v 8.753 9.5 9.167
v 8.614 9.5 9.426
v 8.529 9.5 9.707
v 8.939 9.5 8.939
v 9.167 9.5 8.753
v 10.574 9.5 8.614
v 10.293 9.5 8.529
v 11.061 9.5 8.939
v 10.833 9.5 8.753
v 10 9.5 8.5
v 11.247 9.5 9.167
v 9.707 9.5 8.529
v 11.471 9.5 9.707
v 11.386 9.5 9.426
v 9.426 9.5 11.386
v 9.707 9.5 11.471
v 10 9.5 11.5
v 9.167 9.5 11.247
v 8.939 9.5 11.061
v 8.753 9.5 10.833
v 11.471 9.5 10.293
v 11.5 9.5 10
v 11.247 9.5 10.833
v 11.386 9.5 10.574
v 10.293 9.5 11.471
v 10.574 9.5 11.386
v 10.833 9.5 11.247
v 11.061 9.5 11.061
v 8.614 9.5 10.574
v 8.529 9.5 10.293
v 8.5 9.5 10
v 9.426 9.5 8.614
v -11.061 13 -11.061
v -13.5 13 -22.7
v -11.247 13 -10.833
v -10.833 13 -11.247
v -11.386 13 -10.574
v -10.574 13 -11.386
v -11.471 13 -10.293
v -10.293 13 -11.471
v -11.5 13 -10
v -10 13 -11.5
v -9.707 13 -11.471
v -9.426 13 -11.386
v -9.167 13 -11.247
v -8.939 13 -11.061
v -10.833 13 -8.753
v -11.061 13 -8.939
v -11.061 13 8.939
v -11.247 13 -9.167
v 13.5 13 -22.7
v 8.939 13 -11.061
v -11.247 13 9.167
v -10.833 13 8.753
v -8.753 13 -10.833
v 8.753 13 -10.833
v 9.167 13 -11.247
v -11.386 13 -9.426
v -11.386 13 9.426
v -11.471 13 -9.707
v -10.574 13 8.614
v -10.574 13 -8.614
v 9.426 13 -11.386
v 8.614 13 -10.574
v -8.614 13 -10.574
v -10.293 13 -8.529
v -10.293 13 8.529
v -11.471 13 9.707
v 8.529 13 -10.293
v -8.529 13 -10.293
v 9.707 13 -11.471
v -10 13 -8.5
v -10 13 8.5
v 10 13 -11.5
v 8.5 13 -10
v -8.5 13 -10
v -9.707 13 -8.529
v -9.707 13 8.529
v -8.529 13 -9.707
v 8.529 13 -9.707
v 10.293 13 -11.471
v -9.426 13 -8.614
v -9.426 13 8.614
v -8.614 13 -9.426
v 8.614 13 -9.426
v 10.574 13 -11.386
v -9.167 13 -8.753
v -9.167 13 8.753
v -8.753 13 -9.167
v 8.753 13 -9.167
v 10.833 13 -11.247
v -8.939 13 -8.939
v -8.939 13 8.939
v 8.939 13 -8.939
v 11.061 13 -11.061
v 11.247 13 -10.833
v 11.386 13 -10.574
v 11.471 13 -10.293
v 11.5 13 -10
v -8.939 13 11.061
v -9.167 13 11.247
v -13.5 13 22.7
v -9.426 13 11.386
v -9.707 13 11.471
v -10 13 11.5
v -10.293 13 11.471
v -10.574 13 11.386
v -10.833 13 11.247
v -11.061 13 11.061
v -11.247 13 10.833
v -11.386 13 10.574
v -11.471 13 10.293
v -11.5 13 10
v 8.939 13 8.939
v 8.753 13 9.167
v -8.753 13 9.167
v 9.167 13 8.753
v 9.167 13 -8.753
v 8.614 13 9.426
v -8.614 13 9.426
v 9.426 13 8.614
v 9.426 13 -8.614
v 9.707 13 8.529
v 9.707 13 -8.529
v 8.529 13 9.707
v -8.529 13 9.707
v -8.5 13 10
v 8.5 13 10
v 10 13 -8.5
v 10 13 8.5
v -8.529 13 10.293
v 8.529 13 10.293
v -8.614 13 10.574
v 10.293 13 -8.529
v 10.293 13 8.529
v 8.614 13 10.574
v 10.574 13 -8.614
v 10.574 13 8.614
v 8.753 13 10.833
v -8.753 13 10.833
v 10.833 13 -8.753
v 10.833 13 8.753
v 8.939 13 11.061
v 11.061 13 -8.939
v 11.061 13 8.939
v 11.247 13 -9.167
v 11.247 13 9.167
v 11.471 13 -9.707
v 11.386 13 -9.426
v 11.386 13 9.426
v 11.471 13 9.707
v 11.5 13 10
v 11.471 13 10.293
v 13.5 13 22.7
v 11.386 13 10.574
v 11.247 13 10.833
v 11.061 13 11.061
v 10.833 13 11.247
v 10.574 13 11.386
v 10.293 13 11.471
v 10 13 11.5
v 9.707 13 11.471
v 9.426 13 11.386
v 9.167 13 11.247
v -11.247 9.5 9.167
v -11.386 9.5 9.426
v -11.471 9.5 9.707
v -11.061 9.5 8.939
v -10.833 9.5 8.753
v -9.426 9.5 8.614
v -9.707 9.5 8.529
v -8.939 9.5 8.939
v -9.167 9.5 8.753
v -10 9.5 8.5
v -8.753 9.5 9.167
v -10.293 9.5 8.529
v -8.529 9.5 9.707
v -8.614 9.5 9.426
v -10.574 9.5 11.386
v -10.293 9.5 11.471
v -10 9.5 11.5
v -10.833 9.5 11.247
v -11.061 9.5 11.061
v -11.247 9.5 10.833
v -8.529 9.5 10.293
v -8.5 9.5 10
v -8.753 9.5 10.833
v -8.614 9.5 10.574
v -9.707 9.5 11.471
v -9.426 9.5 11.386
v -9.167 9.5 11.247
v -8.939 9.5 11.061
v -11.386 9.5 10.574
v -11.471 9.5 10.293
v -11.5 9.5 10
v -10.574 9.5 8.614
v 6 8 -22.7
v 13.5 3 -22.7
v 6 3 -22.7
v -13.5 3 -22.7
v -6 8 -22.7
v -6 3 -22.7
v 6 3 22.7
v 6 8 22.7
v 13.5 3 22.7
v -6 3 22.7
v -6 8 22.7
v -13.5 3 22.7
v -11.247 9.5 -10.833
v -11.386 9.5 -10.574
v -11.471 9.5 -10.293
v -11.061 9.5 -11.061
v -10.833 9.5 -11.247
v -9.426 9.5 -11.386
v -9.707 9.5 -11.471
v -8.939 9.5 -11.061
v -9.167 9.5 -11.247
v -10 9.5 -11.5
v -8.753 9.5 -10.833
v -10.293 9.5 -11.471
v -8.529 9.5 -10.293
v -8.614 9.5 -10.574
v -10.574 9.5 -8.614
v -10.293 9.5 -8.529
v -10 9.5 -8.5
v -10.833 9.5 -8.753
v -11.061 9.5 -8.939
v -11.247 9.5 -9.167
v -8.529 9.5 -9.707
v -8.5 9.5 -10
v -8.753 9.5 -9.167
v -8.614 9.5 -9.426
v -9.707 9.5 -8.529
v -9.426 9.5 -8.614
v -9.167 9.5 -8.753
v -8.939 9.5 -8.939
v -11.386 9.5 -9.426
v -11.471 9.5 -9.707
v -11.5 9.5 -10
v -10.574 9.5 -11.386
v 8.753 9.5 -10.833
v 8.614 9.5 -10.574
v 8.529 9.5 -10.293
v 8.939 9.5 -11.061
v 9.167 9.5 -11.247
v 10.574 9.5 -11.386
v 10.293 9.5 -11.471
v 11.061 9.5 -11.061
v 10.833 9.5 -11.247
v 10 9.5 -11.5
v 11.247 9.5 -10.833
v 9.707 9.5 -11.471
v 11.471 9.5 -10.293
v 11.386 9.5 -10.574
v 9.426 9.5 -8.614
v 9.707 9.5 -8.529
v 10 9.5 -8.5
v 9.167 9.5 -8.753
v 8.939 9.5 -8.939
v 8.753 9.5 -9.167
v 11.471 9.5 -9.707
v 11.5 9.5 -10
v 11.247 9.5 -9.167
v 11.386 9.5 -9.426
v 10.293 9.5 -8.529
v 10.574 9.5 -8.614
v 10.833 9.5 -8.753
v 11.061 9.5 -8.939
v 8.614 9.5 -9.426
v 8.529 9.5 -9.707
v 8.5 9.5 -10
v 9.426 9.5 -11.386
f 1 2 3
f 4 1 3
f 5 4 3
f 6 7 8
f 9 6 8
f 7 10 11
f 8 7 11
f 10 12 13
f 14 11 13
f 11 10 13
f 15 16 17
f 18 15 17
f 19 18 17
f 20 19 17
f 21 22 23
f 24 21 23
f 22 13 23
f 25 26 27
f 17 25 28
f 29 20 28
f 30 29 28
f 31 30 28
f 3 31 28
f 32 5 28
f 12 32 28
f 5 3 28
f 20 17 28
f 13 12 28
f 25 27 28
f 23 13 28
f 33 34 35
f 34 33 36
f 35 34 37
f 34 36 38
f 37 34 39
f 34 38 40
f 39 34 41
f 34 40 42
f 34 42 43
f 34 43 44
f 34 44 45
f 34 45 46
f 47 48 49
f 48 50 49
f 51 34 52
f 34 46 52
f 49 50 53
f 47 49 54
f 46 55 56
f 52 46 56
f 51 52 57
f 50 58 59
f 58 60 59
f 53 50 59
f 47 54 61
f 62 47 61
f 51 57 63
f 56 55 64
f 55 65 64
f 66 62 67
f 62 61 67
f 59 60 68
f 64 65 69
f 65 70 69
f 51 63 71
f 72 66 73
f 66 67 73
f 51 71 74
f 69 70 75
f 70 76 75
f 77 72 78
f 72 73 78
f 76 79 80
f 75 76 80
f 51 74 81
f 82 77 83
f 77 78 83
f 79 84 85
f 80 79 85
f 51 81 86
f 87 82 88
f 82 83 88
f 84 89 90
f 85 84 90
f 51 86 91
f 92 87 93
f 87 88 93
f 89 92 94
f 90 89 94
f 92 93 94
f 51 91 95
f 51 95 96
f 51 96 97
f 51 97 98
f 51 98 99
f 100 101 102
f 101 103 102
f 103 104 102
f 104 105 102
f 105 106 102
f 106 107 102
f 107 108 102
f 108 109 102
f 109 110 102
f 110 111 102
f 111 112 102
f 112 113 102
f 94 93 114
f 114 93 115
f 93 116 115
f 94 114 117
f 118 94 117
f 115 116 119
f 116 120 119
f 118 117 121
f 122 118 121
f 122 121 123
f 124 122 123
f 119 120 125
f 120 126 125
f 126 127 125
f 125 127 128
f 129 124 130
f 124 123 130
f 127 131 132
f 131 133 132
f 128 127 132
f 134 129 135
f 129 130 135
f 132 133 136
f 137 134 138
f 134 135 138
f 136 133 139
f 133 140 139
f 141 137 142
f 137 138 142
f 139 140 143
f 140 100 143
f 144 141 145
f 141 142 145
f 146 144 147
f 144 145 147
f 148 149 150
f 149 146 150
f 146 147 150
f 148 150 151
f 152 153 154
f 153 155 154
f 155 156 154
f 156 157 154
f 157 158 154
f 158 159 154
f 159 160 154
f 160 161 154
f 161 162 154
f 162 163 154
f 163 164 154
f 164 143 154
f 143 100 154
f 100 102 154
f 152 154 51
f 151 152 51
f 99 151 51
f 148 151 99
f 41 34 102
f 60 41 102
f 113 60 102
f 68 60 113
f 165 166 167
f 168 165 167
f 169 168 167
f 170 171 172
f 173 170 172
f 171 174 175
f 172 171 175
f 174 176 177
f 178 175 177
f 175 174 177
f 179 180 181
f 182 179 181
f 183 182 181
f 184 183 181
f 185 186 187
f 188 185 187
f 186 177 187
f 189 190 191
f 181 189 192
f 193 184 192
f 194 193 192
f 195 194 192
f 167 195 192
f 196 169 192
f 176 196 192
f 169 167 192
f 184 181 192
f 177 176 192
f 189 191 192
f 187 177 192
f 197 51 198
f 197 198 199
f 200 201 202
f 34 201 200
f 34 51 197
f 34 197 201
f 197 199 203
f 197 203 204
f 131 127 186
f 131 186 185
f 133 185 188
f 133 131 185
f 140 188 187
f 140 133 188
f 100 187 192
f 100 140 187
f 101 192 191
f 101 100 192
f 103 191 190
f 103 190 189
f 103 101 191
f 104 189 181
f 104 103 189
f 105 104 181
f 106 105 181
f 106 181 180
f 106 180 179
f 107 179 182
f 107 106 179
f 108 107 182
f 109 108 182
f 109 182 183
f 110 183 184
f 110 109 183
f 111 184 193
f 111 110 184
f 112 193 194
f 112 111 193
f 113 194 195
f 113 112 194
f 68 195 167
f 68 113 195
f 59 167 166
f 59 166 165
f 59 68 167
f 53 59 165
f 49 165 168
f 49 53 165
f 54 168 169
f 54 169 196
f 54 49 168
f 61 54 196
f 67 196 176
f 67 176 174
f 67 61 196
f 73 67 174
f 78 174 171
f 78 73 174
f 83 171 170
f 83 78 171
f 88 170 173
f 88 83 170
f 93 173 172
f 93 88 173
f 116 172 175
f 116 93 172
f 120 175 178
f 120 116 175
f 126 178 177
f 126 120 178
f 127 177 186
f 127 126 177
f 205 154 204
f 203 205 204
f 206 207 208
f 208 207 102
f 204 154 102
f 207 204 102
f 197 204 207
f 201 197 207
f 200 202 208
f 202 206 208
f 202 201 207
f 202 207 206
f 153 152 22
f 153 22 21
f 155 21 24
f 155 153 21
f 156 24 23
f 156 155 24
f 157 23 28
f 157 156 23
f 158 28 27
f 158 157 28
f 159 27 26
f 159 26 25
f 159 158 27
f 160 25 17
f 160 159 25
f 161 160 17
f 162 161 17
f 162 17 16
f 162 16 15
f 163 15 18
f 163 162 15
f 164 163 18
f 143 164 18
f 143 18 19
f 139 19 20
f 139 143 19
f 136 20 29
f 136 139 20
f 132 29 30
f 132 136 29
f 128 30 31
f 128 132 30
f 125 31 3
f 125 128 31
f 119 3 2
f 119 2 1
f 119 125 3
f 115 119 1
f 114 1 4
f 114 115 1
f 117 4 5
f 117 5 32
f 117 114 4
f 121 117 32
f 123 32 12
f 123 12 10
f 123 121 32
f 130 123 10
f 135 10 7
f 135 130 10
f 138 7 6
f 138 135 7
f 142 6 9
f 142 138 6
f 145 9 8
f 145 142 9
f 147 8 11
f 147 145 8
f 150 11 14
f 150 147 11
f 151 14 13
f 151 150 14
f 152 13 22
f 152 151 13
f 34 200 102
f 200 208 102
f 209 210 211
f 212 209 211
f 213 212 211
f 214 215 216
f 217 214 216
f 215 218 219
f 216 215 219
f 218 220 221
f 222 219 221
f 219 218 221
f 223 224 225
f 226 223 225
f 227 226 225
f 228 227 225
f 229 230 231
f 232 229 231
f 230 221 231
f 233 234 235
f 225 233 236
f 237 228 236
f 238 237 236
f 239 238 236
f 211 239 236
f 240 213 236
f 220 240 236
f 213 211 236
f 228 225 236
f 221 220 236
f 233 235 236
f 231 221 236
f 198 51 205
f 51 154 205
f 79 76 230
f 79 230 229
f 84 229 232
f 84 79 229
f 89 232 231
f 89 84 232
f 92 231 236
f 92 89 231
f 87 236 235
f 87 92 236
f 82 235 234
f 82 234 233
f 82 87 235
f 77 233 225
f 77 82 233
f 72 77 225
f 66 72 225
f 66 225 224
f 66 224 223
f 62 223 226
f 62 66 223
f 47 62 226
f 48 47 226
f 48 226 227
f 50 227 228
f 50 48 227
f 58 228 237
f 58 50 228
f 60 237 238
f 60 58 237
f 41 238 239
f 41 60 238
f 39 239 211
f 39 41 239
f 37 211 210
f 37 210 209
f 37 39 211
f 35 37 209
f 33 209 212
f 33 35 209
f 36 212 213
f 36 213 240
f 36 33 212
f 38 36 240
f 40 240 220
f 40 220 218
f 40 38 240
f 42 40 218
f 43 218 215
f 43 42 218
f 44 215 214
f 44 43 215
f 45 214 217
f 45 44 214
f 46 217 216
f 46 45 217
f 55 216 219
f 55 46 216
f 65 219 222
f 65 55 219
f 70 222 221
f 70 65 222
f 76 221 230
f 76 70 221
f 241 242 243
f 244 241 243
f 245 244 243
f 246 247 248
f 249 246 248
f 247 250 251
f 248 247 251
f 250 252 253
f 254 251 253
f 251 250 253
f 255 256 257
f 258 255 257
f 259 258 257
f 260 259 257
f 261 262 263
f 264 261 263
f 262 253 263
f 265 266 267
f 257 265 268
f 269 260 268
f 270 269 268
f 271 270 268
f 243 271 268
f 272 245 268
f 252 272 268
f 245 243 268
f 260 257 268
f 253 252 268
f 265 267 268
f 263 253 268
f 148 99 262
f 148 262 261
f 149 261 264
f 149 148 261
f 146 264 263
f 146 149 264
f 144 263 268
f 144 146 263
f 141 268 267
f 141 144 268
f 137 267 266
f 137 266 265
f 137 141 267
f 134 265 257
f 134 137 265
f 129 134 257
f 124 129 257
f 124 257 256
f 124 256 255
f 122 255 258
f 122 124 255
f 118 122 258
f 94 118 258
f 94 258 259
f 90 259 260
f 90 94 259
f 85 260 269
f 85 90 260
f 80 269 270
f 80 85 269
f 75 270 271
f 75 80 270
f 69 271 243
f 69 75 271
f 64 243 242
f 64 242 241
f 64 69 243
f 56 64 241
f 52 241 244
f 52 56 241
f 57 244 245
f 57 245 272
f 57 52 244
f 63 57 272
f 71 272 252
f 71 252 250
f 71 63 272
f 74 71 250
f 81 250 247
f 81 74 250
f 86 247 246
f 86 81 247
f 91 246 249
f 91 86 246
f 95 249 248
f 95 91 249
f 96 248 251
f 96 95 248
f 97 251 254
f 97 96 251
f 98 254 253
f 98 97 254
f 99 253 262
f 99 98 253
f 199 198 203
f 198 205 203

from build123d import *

# Parameters (mm, degrees)
PAD_DEPTH    = 22.7
SKETCH001_R  = 1.5
POCKET_DEPTH = 3.5


with BuildPart() as part:
    # Sketch → Pad (new body, symmetric)
    with BuildSketch(Plane.XY):
        Polygon((-6, 8), (-6, 3), (-13.5, 3), (-13.5, 13), (13.5, 13), (13.5, 3), (6, 3), (6, 8), align=None)
    extrude(amount=PAD_DEPTH, both=True)

    # Sketch001 → Pocket (cut)
    with BuildSketch(Plane.XZ.offset(-13)):
        with Locations((-10, 10)):
            Circle(SKETCH001_R)
        with Locations((10, 10)):
            Circle(SKETCH001_R)
        with Locations((10, -10)):
            Circle(SKETCH001_R)
        with Locations((-10, -10)):
            Circle(SKETCH001_R)
    extrude(amount=POCKET_DEPTH, mode=Mode.SUBTRACT)


solid = part.part
